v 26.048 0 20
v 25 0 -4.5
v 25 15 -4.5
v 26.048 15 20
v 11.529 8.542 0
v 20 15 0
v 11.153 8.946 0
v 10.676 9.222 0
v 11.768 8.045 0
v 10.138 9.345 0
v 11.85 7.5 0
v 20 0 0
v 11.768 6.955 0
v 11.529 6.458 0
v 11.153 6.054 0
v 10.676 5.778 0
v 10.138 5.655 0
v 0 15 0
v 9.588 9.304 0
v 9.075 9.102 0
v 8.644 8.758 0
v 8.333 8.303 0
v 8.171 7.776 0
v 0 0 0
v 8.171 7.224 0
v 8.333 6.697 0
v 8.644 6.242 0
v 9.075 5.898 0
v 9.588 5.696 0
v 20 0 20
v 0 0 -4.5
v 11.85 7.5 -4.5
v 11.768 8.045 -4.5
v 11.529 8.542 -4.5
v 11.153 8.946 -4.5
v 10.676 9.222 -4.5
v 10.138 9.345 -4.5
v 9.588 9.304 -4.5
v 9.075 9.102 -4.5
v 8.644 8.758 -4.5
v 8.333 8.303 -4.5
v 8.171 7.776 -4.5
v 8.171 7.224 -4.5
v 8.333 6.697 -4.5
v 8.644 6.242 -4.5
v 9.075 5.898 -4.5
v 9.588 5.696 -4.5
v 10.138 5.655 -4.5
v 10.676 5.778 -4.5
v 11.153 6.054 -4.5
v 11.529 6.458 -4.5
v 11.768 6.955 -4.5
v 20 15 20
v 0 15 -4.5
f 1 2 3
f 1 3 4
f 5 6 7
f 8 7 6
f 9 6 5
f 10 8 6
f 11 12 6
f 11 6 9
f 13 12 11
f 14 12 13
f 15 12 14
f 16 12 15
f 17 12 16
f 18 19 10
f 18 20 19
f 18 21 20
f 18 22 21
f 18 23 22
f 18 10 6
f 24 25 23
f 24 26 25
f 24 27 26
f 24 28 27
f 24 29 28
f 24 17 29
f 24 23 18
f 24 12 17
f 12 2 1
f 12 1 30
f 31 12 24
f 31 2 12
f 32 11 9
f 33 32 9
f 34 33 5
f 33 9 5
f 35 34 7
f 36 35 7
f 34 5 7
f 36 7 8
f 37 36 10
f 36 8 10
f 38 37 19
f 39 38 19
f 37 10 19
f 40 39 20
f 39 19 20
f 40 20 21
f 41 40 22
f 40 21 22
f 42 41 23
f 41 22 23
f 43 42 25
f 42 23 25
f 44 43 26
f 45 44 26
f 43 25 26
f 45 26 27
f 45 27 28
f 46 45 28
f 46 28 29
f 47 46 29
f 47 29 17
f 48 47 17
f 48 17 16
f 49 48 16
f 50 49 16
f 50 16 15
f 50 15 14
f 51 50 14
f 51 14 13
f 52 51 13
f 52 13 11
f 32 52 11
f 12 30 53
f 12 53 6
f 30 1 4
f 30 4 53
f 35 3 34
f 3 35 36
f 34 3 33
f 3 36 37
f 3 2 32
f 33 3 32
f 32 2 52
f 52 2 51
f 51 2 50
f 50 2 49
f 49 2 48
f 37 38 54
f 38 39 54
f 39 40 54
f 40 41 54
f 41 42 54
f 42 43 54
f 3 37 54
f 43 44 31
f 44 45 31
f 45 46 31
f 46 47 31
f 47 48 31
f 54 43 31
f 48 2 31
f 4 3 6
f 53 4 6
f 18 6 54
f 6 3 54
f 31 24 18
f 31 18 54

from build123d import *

# Parameters (mm, degrees)
BOSS_EXTRUDE1_DEPTH = 15
SKETCH2_R           = 1.85
CUT_EXTRUDE1_DEPTH  = 37.104189779


with BuildPart() as part:
    # Sketch1 → Boss-Extrude1 (new body)
    with BuildSketch(Plane(origin=(0, 0, 0), x_dir=(1, 0, 0), z_dir=(0, 1, 0))):
        Polygon((20, 4.5), (25, 4.5), (26.048272872, -20), (20, -20), (20, 0), (0, 0), (0, 4.5), align=None)
    extrude(amount=BOSS_EXTRUDE1_DEPTH)

    # Sketch2 → Cut-Extrude1 (cut, through all)
    with BuildSketch(Plane.XY):
        with Locations((10, 7.5)):
            Circle(SKETCH2_R)
    extrude(amount=-CUT_EXTRUDE1_DEPTH, mode=Mode.SUBTRACT)


solid = part.part
